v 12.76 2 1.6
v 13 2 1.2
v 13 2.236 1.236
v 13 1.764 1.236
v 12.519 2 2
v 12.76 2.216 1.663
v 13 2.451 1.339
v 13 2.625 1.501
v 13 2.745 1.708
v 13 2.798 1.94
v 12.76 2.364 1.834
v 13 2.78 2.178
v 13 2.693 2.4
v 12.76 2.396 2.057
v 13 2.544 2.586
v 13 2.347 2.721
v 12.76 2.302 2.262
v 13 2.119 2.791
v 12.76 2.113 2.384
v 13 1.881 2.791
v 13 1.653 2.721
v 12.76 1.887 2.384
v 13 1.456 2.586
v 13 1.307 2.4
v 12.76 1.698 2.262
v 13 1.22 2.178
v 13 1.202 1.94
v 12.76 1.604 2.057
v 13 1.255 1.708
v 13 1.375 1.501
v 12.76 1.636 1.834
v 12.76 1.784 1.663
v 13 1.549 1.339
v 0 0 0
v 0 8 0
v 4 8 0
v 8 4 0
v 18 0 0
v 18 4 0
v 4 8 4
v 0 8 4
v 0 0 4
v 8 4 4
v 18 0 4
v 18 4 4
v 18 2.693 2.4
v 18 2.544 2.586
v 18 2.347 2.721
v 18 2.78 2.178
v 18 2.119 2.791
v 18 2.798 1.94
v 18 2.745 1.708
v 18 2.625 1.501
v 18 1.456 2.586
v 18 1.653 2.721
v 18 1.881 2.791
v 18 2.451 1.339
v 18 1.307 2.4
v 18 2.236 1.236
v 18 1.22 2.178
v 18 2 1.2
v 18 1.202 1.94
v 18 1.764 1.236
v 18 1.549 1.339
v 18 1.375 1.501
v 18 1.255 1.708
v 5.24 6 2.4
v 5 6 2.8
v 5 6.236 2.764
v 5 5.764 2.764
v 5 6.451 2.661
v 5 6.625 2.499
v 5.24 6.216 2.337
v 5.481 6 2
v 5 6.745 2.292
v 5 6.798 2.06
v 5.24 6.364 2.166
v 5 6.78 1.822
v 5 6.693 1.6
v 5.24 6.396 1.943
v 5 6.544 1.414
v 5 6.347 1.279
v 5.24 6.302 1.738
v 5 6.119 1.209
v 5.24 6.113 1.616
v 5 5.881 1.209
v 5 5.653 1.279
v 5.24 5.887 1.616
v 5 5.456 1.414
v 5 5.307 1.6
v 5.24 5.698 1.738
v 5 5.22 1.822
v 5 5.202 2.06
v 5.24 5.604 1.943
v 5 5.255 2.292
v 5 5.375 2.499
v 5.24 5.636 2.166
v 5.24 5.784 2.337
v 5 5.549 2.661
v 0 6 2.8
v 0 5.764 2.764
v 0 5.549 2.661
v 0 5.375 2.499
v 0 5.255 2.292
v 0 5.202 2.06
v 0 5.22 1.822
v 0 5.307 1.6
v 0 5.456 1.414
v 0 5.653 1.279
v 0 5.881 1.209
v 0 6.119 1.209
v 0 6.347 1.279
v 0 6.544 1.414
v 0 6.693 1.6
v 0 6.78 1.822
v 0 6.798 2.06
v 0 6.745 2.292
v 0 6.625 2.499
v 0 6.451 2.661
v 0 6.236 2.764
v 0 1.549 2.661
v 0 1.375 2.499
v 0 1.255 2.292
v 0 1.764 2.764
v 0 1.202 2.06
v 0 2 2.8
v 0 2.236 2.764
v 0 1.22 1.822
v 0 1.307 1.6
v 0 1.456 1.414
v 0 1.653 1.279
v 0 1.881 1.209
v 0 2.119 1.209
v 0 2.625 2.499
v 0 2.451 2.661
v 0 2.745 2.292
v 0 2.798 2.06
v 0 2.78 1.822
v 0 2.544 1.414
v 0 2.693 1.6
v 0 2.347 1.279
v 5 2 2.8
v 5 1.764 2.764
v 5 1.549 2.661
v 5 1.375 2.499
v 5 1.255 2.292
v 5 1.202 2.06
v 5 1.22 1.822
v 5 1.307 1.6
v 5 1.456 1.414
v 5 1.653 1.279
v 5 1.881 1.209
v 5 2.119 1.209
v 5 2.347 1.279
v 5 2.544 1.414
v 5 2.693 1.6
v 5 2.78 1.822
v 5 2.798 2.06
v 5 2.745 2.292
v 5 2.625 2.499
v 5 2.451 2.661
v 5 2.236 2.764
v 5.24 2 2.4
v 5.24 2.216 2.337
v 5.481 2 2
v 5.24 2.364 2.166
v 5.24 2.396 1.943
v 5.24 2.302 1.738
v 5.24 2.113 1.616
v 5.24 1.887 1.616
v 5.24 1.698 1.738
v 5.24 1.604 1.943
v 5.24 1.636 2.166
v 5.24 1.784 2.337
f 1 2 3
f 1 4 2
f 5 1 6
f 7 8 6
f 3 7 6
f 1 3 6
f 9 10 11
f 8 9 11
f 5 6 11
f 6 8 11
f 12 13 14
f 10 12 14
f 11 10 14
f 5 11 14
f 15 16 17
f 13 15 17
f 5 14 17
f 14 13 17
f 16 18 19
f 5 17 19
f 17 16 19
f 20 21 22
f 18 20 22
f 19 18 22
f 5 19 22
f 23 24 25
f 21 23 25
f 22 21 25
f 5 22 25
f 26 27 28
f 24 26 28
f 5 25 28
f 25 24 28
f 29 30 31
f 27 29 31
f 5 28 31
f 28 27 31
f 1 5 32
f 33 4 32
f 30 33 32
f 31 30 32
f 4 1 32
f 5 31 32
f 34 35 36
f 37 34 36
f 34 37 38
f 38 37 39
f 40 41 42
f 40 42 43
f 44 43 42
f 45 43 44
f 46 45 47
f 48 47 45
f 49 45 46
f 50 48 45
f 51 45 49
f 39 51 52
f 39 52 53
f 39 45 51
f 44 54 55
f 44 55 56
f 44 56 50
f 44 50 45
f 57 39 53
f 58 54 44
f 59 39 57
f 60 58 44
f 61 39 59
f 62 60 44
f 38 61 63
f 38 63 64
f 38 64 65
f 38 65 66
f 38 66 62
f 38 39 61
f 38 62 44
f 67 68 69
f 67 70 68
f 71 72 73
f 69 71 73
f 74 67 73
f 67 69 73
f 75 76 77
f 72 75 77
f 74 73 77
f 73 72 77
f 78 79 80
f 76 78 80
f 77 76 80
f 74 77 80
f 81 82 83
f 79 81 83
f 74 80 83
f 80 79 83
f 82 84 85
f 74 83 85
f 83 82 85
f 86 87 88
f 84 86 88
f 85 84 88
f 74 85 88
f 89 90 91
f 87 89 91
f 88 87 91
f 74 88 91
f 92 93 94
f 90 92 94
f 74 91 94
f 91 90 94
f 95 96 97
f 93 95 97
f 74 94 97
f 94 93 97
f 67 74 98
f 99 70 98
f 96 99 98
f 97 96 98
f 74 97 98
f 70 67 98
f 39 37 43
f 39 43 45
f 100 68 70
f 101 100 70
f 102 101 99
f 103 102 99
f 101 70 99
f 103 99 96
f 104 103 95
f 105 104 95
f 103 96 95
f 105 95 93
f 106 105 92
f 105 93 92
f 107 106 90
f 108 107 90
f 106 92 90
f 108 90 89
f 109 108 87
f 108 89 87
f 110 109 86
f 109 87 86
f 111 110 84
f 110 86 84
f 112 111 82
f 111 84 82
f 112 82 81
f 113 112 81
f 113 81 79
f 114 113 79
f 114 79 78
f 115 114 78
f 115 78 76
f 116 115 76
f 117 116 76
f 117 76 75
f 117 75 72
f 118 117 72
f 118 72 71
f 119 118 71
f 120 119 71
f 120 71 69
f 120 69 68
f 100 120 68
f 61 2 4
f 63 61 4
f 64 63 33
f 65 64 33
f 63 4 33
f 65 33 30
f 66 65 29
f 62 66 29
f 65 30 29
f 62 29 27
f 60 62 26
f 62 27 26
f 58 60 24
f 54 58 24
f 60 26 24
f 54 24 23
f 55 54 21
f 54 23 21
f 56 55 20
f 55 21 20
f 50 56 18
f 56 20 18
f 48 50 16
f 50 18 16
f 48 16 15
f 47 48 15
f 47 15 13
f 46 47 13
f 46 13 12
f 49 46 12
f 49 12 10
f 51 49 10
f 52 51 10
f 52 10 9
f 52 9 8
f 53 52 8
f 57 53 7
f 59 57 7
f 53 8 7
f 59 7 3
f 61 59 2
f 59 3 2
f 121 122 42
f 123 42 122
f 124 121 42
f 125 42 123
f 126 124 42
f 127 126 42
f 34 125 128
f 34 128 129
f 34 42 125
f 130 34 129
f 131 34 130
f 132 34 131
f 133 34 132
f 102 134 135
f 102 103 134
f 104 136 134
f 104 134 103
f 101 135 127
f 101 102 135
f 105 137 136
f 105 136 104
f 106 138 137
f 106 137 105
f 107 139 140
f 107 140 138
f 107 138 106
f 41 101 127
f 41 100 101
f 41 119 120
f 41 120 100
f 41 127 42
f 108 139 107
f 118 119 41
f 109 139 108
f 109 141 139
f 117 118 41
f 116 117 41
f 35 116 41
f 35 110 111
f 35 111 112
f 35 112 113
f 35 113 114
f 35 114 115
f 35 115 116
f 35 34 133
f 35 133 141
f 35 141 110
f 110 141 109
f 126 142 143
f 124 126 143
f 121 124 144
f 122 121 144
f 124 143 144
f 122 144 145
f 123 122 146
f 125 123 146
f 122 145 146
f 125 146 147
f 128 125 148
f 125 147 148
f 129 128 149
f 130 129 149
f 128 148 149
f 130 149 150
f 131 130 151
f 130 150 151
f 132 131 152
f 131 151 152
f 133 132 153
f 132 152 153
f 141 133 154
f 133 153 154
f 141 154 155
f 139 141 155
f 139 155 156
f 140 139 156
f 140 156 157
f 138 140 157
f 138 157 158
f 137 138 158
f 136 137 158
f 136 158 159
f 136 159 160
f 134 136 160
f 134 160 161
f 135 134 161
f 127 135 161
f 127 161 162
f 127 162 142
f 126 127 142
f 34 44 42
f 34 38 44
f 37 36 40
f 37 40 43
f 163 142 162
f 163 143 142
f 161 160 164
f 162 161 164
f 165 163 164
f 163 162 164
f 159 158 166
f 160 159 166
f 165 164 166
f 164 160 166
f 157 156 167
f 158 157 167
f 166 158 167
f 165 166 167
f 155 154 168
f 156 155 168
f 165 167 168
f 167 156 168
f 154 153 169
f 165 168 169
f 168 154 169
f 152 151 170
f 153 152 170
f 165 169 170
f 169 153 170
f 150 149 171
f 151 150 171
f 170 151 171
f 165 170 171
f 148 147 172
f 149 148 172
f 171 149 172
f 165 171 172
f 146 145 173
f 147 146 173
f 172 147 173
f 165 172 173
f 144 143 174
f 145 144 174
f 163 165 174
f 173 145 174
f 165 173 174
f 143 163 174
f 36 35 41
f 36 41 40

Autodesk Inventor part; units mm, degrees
ref_plane "YZ Plane" through (0, 0, 0) normal (1, 0, 0) x (0, 1, 0)
ref_plane "XZ Plane" through (0, 0, 0) normal (0, 1, 0) x (-1, 0, 0)
ref_plane "XY Plane" through (0, 0, 0) normal (0, 0, 1) x (1, 0, 0)
sketch "Sketch1" plane through (0, 0, 0) normal (0, 0, 1) x (1, 0, 0)
  line L0 (0, 0) -> (0, 8)
  line L1 (0, 8) -> (4, 8)
  line L2 (4, 8) -> (8, 4)
  line L3 (8, 4) -> (18, 4)
  line L4 (18, 4) -> (18, 0)
  line L5 (18, 0) -> (0, 0)
  dimension "d0" = 18
  dimension "d1" = 4
  dimension "d2" = 8
  dimension "d3" = 4
  dimension "d4" = 45
extrude "Extrusion1" add sketch "Sketch1" along normal blind 4
sketch "Sketch2" plane through (0, 0, 0) normal (-1, 0, 0) x (0, 0, 1)
  line L0 (0, 0) -> (0, 8) projected
  line L1 (0, 0) -> (4, 0) projected
  line L2 (4, 8) -> (4, 0) projected
  line L3 (0, 8) -> (4, 8) projected
  line L4 (2, 0) -> (2, 8) construction
  line L5 (0, 4) -> (4, 4) construction
  point P0 (2, 2)
  point P1 (2, 6)
  dimension "d7" = 4
hole "Hole1" at (0, 2, 2) at (0, 6, 2) direction (1, 0, 0) diameter 1.6 depth 5 tip angle 118
sketch "Sketch3" plane through (18, 0, 0) normal (1, 0, 0) x (0, 0, -1)
  line L0 (0, 4) -> (0, 0) projected
  line L1 (0, 4) -> (-4, 4) projected
  line L2 (-4, 0) -> (-4, 4) projected
  line L3 (0, 0) -> (-4, 0) projected
  line L4 (0, 0) -> (-4, 4) construction
  point P0 (0, 0)
  point P1 (-2, 2)
hole "Hole2" at (18, 2, 2) direction (-1, 0, 0) diameter 1.6 depth 5 tip angle 118
properties part number "support 1"
